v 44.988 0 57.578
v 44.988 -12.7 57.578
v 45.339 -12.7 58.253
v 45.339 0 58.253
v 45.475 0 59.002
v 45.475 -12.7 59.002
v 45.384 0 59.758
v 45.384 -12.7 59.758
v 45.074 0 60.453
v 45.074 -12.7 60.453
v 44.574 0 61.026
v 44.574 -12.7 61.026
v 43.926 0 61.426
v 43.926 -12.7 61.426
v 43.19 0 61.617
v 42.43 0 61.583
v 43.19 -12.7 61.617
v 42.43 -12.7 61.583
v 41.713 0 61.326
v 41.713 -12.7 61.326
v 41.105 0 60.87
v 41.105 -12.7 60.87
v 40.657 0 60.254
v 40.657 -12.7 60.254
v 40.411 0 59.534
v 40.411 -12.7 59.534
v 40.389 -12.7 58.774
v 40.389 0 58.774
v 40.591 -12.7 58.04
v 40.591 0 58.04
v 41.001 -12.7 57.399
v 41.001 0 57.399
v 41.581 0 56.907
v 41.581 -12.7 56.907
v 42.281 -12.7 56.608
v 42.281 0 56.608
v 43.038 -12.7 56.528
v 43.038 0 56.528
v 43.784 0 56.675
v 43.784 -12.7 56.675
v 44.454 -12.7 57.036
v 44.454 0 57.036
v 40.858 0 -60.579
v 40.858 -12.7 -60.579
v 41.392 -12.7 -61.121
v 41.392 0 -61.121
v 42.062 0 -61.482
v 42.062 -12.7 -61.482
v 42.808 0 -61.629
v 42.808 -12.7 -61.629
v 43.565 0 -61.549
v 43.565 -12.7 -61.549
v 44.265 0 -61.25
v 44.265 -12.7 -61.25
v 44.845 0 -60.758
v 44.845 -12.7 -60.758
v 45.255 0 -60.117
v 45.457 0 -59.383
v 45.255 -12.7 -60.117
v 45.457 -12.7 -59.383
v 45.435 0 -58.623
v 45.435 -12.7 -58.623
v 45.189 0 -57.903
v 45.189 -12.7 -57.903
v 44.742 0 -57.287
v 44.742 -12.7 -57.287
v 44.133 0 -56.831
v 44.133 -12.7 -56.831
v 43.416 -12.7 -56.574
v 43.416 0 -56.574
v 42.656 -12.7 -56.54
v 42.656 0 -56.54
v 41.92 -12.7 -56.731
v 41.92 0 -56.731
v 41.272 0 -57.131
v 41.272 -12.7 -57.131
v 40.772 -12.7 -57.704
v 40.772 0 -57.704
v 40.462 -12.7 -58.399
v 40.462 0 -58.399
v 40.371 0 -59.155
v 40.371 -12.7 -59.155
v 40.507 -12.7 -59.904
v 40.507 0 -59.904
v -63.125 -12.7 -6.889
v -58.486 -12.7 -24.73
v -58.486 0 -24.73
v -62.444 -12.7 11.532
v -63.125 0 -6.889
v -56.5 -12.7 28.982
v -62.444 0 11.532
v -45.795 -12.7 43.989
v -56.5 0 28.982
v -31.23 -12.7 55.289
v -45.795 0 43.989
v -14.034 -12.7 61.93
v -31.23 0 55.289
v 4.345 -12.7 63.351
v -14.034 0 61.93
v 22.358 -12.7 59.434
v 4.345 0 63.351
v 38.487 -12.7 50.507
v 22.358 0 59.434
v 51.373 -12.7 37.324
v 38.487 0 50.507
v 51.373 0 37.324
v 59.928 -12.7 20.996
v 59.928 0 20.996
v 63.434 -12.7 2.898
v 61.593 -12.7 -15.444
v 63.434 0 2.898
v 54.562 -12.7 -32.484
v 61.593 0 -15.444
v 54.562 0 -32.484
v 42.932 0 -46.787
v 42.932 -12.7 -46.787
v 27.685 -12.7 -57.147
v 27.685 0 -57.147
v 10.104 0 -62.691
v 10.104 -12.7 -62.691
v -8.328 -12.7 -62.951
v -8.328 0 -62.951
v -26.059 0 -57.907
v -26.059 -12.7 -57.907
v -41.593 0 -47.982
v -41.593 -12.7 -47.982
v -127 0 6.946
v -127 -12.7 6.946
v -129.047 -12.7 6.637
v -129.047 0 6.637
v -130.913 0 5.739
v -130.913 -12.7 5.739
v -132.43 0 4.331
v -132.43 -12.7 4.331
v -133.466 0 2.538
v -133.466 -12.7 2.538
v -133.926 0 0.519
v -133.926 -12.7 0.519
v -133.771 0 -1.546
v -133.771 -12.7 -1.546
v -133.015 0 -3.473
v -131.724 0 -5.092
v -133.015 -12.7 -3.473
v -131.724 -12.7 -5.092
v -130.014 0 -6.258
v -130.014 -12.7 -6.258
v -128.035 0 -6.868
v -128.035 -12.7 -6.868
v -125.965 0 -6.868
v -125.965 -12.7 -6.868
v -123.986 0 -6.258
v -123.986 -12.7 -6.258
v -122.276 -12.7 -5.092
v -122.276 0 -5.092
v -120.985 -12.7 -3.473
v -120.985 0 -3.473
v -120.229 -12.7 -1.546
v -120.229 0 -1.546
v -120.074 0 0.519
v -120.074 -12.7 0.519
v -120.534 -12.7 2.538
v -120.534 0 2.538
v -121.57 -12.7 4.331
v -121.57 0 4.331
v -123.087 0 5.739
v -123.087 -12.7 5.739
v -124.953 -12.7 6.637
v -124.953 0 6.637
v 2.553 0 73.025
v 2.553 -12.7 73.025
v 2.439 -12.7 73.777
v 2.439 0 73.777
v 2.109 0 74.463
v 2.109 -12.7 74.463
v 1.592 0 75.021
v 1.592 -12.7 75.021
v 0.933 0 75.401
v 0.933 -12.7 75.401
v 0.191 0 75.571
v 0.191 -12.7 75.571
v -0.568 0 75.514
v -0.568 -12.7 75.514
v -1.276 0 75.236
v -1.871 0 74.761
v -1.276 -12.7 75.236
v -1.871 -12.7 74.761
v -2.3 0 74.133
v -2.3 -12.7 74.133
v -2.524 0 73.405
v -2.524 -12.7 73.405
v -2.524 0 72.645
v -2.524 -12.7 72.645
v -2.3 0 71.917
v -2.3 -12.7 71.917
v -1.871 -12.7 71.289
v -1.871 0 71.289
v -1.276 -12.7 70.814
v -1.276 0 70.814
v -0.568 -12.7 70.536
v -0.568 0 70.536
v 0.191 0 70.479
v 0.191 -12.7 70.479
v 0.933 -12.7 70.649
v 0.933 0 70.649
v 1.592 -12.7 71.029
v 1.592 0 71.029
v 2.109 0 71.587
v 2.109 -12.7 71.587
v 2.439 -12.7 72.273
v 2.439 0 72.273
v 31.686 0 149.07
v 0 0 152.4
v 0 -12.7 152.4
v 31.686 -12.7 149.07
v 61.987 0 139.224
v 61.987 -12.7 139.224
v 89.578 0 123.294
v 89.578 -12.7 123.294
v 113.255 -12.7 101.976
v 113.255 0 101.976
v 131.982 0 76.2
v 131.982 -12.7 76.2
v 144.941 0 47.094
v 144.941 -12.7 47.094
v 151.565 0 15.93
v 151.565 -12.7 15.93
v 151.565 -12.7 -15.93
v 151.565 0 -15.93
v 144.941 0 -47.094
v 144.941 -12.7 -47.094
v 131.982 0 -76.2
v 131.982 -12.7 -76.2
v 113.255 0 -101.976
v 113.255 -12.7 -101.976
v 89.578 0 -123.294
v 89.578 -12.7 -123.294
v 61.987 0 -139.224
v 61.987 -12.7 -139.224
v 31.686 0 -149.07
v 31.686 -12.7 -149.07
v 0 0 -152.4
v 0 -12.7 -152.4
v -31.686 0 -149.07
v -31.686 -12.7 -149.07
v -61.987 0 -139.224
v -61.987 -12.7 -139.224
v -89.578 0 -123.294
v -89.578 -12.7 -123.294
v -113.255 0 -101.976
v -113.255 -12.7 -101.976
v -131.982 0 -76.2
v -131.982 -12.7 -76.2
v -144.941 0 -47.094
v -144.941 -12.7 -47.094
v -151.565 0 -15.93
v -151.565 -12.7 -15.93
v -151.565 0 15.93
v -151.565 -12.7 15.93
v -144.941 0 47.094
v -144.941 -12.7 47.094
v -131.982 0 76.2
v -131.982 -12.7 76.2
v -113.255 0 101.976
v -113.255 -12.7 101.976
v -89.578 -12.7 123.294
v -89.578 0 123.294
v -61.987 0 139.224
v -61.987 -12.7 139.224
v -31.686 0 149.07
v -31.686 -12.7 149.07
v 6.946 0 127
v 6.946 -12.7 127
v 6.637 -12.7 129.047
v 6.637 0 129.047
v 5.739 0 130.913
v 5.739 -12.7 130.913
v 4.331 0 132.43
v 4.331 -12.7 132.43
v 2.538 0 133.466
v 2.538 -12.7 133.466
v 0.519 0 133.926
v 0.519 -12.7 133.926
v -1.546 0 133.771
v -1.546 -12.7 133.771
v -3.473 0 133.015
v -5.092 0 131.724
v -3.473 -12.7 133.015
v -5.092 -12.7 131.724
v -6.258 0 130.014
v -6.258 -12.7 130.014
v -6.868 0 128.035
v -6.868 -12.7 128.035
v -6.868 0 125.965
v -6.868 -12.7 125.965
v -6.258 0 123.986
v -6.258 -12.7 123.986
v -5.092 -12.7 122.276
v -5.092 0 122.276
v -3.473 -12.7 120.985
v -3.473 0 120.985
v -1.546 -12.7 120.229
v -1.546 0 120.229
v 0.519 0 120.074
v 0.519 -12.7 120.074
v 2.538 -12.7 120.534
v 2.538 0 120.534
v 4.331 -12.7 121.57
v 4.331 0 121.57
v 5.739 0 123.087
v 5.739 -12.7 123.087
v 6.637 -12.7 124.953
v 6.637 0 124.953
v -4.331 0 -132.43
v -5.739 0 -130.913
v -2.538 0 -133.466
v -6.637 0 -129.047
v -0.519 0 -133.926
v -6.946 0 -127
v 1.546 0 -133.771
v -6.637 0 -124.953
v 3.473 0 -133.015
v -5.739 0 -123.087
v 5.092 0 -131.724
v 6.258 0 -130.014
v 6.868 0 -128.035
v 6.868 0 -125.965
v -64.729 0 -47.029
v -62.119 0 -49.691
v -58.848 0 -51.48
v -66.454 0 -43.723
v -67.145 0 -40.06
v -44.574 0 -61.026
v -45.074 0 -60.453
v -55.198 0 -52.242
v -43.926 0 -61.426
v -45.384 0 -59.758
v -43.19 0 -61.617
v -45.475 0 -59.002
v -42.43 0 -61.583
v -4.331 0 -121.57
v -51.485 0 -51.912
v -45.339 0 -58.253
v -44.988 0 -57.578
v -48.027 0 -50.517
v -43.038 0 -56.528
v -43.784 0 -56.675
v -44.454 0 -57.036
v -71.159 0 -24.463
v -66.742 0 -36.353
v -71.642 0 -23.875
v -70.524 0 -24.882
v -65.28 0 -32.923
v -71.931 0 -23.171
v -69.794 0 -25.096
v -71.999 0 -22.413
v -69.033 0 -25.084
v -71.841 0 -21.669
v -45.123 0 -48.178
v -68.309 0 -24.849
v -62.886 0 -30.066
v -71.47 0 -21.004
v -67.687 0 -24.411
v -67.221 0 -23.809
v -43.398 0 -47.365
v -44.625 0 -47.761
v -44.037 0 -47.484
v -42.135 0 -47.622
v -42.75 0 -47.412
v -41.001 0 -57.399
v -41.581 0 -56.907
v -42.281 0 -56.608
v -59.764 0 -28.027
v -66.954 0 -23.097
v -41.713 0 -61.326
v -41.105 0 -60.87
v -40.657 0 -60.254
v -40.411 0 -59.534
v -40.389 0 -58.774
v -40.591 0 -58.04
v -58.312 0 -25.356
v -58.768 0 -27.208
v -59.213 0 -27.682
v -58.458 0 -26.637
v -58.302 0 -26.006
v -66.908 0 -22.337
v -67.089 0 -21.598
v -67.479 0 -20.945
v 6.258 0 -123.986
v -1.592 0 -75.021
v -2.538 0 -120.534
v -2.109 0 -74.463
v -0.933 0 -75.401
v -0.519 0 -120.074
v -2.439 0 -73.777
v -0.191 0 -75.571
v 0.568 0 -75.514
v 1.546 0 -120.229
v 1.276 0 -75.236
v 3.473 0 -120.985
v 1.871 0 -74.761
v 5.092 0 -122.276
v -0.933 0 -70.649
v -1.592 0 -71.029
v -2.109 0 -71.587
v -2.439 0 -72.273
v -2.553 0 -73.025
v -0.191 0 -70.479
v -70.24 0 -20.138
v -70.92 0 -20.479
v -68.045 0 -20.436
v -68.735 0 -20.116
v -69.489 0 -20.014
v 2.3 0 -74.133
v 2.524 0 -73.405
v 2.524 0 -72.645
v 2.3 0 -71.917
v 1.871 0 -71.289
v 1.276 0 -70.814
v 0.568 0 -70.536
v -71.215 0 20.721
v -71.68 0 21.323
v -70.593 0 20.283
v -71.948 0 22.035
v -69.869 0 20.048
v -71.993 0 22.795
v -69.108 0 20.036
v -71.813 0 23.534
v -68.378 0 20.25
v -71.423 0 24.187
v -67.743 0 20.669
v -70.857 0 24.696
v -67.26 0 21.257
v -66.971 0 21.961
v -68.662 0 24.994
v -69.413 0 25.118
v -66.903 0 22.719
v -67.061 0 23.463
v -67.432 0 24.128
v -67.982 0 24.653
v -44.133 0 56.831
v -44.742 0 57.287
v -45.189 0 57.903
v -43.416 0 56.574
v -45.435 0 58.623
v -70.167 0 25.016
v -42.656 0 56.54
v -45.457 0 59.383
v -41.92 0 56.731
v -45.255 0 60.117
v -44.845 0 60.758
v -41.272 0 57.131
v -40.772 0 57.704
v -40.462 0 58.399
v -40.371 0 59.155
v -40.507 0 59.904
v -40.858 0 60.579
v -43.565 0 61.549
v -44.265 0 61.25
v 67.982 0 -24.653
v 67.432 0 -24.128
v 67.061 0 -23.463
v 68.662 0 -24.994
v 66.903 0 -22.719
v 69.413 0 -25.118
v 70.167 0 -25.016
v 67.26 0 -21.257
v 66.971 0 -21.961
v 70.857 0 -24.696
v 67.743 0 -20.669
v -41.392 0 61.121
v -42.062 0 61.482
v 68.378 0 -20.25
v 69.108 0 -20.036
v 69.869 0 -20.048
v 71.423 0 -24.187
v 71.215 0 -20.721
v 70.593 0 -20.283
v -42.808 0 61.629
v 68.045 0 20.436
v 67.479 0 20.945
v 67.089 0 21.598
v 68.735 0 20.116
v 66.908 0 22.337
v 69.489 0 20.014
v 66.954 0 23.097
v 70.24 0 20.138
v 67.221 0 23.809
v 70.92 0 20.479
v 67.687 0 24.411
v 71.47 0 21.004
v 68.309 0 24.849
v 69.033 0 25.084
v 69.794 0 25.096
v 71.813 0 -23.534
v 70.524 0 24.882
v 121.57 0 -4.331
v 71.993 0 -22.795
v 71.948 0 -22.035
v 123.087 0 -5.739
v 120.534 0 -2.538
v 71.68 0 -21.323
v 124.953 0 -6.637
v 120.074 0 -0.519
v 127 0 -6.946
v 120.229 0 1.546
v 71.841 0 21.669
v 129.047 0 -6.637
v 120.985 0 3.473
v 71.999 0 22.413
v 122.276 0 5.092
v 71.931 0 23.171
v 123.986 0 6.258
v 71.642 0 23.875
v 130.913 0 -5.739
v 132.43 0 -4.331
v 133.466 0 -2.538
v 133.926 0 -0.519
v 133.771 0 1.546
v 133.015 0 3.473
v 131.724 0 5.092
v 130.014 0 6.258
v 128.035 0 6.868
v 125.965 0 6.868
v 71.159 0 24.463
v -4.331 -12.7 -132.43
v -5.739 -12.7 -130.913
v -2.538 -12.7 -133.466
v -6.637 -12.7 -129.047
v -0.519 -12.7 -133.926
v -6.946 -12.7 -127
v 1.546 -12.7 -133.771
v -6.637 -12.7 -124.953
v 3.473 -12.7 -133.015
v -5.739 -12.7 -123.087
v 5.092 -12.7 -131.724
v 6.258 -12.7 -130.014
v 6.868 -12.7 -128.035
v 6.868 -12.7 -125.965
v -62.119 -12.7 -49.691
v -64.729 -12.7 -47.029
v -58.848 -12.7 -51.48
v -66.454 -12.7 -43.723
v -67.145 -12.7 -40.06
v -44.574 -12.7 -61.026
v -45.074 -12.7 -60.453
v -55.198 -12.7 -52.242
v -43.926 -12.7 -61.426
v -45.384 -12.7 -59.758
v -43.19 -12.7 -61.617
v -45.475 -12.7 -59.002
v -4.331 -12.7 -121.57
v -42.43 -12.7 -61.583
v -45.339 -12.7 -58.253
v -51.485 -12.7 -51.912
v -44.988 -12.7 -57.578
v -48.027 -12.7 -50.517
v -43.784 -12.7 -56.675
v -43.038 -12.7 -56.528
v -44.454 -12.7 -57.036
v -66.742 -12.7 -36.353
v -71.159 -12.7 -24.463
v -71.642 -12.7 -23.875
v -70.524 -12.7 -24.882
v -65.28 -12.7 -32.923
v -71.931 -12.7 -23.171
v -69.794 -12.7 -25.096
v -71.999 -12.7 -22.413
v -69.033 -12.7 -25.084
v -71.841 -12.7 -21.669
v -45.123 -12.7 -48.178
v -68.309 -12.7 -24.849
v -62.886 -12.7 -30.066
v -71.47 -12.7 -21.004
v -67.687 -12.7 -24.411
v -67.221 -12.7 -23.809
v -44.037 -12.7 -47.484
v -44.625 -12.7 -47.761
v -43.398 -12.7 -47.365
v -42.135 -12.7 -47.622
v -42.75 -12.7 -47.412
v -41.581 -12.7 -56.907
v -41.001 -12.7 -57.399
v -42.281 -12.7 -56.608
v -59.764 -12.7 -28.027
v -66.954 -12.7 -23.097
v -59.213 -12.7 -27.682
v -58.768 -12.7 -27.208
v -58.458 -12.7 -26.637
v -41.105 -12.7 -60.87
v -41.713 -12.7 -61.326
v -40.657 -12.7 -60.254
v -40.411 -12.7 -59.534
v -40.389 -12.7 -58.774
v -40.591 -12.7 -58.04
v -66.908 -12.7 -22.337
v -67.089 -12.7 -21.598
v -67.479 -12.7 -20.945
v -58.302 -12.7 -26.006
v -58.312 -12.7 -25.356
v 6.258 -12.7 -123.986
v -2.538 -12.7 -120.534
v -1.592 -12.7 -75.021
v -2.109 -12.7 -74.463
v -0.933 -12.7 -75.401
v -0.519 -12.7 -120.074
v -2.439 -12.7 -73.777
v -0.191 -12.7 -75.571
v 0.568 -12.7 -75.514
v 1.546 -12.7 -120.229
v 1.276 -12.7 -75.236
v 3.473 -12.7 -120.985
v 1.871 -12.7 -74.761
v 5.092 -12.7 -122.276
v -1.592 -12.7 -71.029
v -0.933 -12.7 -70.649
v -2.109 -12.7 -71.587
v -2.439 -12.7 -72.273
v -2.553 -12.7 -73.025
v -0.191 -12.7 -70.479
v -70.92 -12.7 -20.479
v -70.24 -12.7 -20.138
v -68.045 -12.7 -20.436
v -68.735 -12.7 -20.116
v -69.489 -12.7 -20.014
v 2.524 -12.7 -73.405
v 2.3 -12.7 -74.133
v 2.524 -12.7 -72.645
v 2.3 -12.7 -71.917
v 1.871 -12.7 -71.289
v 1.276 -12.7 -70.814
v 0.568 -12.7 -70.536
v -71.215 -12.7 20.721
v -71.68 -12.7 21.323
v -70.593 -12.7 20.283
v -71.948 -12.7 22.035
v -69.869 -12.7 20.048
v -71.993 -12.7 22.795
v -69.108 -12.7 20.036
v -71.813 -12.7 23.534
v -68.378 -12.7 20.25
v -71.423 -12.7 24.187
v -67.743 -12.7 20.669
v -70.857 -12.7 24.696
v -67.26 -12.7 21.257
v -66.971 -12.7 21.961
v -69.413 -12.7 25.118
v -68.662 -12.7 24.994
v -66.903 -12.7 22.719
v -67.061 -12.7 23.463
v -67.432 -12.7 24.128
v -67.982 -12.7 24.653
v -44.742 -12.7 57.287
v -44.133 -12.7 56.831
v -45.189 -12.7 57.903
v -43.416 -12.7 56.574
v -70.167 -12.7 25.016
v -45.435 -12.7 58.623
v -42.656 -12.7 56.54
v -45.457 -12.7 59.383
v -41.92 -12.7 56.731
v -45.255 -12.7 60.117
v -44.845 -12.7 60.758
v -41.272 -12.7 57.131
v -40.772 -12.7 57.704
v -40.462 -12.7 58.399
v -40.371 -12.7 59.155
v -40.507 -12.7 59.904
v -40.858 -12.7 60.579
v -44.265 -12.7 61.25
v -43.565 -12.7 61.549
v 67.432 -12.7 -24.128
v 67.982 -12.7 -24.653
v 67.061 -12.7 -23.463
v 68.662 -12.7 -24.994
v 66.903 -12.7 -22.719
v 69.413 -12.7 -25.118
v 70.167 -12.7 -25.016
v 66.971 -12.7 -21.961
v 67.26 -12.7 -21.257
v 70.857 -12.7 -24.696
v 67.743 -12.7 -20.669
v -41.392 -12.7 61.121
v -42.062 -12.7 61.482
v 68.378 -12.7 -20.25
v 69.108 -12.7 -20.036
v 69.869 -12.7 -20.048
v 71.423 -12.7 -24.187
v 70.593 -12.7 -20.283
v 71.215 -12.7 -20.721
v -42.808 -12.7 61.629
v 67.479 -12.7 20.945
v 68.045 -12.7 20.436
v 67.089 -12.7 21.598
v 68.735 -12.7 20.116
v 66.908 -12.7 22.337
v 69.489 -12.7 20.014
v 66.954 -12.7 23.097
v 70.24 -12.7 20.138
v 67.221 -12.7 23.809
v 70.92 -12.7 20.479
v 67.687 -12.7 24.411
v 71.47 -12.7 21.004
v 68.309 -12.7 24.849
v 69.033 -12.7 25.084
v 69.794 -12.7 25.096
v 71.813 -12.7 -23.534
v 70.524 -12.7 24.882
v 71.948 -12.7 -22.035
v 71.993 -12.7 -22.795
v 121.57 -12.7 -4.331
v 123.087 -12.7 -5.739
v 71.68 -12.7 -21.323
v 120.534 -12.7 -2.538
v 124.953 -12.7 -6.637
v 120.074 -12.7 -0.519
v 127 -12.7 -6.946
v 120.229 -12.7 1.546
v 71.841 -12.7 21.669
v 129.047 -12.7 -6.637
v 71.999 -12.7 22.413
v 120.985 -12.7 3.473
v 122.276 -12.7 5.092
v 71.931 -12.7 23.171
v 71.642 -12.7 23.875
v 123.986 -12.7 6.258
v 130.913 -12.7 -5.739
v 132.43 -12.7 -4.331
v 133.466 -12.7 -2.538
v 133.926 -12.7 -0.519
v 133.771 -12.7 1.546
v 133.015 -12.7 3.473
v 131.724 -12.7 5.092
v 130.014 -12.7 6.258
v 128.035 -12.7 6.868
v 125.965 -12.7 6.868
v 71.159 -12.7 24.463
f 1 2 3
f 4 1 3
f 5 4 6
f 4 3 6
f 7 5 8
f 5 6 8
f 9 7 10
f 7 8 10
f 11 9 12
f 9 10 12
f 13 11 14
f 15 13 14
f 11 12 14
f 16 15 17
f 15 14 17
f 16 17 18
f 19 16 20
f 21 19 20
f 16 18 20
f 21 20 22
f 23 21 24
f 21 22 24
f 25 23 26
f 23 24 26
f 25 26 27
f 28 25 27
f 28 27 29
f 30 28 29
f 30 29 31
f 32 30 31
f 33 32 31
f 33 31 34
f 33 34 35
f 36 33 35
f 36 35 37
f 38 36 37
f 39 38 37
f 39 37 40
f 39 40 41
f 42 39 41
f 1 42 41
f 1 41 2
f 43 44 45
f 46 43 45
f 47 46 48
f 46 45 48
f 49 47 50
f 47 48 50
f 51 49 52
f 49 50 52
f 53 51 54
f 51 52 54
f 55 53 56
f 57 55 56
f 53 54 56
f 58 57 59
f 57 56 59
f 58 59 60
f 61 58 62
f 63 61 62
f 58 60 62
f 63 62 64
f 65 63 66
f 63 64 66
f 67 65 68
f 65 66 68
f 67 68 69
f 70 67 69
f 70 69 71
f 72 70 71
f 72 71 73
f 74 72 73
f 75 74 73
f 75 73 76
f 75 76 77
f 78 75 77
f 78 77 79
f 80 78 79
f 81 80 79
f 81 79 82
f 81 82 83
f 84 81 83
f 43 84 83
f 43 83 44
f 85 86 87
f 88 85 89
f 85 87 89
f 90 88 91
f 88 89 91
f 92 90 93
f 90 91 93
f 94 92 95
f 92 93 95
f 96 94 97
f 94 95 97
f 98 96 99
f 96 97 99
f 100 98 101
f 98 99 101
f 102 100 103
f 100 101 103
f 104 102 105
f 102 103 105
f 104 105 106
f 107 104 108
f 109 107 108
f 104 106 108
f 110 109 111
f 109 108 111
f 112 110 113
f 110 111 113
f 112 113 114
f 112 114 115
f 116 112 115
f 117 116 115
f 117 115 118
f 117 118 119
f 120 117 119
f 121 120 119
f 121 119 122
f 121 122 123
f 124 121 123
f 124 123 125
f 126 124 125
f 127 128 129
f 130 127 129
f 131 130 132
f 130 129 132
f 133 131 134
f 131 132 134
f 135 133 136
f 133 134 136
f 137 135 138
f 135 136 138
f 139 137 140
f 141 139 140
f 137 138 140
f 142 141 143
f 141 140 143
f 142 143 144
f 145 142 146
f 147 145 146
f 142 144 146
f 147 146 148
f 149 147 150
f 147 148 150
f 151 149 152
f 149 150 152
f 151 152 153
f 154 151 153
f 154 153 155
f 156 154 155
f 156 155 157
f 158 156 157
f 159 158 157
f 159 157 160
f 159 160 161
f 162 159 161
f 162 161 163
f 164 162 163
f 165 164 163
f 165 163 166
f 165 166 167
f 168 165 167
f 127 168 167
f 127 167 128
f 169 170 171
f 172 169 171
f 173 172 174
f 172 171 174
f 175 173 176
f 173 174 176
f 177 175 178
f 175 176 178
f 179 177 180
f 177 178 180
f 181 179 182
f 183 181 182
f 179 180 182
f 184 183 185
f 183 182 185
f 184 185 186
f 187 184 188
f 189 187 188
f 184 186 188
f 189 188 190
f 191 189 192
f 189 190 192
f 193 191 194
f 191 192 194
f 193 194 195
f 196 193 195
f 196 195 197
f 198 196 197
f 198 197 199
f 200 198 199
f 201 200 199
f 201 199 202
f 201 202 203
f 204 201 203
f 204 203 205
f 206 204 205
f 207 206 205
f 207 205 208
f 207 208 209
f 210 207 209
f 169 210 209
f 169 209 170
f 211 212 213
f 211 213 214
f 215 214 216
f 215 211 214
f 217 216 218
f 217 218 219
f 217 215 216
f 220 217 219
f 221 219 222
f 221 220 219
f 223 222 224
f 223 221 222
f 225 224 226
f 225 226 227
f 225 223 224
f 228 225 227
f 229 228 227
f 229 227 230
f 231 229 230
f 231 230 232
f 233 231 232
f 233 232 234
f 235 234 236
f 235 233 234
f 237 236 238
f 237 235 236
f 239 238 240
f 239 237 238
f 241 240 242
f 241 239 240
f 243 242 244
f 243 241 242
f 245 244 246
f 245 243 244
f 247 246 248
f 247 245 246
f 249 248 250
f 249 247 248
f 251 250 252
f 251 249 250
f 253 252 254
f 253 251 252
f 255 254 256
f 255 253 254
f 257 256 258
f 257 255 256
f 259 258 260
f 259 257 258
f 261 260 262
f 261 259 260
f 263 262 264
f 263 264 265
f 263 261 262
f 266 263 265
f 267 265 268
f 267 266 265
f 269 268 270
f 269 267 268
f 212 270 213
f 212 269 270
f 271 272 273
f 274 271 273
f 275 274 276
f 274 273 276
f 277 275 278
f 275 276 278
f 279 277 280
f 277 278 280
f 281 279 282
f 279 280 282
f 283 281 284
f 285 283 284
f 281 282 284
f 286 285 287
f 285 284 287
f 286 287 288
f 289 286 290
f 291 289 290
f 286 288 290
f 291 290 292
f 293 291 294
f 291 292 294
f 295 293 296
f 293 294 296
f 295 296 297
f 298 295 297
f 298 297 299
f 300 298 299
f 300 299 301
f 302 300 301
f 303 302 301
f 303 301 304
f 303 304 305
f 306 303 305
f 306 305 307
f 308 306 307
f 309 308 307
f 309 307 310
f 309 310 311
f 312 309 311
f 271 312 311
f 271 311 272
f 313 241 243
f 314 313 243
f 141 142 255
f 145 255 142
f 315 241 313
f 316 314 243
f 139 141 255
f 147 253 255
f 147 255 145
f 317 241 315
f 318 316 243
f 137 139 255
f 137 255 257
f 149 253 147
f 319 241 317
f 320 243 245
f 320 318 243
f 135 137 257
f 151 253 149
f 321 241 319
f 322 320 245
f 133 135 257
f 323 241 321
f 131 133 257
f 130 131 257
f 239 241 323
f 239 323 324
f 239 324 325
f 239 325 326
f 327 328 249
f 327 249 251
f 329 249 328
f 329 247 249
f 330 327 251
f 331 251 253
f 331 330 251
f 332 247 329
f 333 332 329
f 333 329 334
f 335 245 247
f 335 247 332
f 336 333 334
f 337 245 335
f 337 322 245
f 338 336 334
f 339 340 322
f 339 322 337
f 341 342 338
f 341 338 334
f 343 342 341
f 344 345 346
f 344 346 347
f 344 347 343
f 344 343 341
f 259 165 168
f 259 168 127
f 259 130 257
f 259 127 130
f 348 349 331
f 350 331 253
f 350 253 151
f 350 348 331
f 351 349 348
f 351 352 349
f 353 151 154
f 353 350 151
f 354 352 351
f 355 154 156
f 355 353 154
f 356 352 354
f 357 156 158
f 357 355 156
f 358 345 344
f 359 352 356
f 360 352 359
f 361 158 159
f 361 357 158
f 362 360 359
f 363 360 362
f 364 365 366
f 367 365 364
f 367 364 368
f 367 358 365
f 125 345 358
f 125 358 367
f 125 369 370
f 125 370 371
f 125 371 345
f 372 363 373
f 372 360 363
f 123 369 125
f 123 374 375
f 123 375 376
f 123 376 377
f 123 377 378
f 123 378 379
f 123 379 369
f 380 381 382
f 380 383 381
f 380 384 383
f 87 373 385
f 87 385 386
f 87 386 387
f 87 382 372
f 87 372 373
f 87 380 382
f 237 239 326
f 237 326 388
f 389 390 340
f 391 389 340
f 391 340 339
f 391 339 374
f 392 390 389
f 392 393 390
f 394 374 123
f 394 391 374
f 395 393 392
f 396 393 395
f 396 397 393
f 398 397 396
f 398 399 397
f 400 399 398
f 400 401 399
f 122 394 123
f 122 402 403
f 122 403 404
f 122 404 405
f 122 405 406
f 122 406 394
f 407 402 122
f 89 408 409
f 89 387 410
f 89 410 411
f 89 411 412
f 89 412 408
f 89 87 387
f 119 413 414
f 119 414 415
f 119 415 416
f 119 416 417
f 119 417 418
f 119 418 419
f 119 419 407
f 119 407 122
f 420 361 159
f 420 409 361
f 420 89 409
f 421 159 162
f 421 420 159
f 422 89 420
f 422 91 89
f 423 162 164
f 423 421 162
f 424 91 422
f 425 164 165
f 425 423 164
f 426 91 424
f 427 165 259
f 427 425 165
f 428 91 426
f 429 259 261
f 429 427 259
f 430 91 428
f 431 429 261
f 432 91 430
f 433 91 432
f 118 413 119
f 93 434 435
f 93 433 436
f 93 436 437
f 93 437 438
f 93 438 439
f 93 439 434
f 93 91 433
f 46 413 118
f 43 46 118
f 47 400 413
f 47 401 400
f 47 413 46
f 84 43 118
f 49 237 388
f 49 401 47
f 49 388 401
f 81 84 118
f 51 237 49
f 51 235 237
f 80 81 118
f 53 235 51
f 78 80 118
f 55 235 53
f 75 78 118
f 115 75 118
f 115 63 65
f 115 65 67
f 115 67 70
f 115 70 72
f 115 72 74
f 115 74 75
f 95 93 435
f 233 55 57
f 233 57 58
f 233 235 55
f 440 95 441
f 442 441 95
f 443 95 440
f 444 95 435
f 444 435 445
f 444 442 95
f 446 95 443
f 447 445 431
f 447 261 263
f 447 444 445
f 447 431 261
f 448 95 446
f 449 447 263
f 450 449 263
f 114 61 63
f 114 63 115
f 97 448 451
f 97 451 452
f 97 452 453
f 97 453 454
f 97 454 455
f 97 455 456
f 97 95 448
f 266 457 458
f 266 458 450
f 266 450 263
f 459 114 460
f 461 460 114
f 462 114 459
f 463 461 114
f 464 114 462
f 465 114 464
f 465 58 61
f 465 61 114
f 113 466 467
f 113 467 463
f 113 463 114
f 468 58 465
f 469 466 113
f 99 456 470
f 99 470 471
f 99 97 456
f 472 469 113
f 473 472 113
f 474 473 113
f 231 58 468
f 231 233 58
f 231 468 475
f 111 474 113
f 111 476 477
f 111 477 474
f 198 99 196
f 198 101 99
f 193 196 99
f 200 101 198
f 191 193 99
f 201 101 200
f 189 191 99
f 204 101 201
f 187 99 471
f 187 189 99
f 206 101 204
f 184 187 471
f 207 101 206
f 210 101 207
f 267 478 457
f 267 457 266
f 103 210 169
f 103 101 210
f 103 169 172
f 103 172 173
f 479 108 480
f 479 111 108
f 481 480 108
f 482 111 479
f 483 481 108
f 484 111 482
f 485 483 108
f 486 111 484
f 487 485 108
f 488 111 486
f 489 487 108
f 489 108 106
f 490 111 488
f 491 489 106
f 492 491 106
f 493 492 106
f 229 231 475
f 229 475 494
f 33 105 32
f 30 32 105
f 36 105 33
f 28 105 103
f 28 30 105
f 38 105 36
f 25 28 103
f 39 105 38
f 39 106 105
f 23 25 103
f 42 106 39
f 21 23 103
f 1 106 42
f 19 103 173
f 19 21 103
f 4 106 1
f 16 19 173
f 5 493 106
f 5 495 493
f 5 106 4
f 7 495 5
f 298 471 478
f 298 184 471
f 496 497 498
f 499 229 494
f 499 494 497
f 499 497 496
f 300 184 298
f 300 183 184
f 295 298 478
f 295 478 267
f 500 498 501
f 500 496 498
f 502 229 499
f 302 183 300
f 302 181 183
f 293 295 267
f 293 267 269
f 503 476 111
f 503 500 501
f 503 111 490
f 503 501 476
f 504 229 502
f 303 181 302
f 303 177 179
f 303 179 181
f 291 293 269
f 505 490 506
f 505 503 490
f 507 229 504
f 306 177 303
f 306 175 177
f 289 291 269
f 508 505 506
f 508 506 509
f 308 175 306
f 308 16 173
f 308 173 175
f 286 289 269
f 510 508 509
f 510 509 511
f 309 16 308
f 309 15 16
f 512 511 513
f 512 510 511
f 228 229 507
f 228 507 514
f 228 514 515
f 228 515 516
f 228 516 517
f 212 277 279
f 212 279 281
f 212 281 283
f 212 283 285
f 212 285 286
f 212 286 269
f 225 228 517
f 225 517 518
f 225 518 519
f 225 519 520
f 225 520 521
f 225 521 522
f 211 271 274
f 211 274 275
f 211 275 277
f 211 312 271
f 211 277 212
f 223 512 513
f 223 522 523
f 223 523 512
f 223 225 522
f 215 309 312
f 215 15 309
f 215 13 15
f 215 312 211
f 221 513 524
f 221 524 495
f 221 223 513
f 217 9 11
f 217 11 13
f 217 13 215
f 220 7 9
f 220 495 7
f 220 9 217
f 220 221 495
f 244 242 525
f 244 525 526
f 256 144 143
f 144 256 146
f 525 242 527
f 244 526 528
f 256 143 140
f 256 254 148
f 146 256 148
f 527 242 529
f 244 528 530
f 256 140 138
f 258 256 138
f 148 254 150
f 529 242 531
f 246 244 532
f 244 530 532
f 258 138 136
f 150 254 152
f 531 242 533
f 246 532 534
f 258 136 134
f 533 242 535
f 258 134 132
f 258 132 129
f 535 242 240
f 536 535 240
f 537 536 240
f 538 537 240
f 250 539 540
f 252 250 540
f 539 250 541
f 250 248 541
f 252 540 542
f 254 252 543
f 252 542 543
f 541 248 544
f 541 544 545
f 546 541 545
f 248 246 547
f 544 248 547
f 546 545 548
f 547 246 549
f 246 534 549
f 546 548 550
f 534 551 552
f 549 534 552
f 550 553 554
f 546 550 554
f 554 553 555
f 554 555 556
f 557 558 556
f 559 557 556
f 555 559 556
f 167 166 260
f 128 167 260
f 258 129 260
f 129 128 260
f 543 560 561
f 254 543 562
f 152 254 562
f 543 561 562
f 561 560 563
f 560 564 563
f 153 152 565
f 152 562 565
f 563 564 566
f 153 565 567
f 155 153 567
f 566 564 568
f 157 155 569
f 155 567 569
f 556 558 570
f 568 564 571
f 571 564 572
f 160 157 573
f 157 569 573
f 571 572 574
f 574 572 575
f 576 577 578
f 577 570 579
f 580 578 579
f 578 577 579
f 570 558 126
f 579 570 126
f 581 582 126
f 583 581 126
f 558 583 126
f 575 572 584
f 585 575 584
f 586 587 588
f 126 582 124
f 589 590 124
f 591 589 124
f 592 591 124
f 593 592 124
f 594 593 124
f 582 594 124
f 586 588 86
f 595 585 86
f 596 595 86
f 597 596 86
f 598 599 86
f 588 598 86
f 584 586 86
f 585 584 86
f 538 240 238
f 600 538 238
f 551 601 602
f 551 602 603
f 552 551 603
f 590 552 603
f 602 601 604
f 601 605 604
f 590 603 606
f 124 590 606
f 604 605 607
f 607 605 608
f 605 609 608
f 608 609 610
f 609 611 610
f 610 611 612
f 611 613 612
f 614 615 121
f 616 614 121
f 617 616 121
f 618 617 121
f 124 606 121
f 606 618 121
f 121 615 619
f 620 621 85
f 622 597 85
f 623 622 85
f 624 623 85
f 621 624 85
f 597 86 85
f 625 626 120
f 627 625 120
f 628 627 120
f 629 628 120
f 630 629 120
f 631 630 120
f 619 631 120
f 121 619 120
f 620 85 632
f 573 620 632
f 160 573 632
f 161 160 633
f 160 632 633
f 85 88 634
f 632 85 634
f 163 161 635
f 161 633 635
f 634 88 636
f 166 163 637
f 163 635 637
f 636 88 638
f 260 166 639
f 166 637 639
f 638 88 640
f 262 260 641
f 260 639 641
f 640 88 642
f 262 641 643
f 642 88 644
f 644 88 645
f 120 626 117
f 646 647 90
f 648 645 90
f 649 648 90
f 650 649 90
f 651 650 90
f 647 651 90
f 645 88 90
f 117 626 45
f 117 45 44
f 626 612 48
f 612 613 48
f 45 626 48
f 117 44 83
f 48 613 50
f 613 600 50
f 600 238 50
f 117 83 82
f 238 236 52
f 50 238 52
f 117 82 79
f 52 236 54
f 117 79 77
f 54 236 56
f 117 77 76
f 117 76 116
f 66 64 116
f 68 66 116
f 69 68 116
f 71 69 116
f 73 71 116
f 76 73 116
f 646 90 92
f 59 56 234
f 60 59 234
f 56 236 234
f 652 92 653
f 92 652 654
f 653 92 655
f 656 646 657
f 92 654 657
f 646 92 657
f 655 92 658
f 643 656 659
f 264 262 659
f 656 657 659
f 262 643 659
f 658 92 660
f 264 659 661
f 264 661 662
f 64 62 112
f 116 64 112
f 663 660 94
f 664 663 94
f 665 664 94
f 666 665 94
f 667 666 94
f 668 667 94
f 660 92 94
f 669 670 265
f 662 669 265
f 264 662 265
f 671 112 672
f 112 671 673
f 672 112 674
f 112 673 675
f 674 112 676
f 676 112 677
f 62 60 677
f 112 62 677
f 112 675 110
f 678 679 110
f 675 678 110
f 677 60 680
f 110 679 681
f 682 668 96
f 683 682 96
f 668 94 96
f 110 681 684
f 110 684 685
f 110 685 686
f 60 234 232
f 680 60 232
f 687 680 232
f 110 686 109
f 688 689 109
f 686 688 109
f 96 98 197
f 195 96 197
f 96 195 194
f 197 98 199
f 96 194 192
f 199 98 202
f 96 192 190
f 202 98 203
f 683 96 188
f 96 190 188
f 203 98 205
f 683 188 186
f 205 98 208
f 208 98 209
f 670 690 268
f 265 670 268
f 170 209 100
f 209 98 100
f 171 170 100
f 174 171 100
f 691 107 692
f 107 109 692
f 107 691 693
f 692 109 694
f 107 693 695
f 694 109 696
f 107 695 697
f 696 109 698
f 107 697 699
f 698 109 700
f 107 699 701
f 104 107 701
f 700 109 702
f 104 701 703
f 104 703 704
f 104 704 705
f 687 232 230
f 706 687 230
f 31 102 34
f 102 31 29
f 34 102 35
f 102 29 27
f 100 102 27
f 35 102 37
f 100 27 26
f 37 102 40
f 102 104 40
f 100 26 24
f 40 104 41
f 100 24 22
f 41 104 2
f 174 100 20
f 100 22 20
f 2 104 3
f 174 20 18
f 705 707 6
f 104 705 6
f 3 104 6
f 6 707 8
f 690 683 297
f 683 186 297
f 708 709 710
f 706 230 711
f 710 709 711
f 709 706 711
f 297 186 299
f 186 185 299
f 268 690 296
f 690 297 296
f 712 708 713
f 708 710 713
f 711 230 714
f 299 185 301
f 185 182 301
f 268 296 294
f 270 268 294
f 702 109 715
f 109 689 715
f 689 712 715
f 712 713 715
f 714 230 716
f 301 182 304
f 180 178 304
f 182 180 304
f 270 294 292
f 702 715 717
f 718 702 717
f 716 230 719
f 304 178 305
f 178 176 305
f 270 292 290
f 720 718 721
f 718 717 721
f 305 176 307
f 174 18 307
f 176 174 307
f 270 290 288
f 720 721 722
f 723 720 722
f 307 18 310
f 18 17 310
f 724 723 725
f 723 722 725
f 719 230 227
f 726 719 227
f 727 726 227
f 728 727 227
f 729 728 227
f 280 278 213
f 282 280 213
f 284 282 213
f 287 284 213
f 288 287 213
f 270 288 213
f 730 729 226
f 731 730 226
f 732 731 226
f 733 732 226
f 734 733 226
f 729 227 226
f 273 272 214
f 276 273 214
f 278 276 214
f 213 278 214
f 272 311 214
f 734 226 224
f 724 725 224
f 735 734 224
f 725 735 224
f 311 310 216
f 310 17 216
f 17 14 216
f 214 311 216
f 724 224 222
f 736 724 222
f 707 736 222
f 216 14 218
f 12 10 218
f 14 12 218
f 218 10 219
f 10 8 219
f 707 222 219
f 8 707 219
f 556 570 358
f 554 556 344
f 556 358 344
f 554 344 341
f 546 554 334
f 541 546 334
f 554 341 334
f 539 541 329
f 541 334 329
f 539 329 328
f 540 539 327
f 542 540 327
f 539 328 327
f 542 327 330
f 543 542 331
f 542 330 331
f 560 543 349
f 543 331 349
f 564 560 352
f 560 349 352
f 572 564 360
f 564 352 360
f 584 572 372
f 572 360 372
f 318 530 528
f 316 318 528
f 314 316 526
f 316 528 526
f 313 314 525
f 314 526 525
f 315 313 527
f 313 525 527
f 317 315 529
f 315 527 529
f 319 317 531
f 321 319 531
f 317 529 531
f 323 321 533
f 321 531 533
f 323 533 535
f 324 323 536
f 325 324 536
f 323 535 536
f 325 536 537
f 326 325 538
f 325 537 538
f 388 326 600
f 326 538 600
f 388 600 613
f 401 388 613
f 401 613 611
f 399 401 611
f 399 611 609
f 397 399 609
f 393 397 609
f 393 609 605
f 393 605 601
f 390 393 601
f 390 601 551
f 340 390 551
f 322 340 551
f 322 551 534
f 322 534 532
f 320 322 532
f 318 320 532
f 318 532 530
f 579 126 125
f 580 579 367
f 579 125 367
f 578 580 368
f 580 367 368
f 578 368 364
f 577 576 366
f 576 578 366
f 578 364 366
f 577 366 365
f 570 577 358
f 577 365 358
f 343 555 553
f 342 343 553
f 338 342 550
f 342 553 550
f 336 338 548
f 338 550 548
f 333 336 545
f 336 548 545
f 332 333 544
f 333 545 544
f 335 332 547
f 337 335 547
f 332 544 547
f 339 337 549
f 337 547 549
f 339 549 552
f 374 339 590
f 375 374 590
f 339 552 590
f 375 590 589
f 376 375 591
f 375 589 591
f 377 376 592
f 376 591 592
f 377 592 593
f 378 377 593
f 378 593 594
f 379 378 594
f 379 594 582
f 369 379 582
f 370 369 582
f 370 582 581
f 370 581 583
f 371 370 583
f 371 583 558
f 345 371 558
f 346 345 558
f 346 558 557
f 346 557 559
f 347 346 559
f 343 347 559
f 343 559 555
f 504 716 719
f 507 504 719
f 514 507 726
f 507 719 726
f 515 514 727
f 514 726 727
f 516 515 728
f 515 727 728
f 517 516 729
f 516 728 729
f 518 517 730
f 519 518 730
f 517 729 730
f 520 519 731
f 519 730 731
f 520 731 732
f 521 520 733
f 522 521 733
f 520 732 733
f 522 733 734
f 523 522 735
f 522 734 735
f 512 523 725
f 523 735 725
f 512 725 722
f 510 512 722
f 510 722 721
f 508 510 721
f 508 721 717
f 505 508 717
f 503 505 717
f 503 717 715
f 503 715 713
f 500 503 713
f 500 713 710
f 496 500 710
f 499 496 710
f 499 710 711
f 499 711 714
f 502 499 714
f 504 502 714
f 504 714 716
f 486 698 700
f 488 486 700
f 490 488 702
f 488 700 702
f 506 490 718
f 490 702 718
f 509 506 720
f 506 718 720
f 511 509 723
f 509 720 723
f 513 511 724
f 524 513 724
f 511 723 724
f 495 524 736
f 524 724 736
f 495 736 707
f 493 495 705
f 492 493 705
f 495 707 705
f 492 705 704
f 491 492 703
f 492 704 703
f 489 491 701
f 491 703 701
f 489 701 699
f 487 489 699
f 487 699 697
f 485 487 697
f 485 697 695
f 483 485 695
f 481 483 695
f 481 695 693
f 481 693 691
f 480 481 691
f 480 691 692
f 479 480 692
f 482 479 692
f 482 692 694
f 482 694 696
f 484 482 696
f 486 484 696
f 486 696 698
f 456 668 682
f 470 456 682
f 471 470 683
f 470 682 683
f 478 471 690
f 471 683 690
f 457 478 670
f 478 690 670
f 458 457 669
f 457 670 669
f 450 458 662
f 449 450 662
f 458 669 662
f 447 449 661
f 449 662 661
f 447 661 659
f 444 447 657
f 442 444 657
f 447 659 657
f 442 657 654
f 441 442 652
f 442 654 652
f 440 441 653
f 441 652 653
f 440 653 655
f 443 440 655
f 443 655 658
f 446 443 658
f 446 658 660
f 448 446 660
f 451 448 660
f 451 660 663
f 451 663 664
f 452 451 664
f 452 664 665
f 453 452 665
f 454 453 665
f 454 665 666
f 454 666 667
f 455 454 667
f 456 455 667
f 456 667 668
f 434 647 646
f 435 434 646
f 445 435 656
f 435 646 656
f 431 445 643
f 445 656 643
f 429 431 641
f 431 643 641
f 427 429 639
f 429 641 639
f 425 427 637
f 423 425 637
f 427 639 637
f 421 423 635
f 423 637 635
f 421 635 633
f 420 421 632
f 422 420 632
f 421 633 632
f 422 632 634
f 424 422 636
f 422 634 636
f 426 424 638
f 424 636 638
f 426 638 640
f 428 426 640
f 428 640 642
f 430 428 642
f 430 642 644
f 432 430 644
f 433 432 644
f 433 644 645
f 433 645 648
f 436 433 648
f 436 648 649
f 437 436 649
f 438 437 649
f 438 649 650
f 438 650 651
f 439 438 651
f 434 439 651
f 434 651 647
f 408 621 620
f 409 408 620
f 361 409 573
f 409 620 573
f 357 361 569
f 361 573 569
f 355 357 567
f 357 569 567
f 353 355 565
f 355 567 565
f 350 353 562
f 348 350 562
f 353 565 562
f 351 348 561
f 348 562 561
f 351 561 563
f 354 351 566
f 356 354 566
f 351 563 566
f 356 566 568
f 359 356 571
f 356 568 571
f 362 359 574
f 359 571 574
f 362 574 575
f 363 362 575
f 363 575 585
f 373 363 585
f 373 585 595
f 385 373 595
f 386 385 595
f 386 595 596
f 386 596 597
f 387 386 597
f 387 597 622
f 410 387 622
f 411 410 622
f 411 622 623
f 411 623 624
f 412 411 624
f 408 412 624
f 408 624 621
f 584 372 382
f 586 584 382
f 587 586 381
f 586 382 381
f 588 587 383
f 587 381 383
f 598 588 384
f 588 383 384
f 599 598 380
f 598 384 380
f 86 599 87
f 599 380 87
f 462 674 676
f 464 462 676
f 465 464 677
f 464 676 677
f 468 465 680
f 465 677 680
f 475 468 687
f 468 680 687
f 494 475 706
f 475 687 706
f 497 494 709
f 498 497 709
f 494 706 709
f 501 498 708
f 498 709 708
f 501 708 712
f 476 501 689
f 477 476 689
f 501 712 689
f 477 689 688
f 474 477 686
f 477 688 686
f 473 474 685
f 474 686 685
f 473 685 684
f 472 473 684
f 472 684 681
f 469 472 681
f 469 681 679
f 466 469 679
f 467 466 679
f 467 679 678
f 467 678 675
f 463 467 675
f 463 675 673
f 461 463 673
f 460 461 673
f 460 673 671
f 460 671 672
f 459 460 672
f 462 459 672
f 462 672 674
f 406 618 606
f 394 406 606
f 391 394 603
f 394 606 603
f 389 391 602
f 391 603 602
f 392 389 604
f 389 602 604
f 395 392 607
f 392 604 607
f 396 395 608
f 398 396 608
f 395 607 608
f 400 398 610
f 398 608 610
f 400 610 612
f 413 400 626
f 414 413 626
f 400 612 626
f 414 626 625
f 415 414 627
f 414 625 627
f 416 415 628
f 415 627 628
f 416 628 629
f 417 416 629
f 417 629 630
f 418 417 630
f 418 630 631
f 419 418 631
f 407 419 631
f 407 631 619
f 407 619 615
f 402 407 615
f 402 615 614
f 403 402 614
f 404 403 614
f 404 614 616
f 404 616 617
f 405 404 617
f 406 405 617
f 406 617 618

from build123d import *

# Parameters (mm, degrees)
SKETCH1_R                           = 152.4
SKETCH1_R_2                         = 63.5
THRUSTPLATE_TC3_DEPTH               = 12.7
UNDEF_CLEARANCE_THRUSTPLATE_D       = 13.89126
CLEARANCE_THRUSTPLATE_PATTERN_COUNT = 4
F_10_CLEARANCE_HOLE1_D              = 5.1054
CIRPATTERN1_COUNT                   = 10
CUT_EXTRUDE1_REACH                  = 217.9


with BuildPart() as part:
    # Sketch1 → ThrustPlate_TC3 (new body)
    with BuildSketch(Plane(origin=(0, 0, 0), x_dir=(1, 0, 0), z_dir=(0, 1, 0))):
        with Locations(Location((0, 0, 0), (0, 0, 270))):
            Circle(SKETCH1_R)
        with Locations(Location((0, 0, 0), (0, 0, 270))):
            Circle(SKETCH1_R_2, mode=Mode.SUBTRACT)
    extrude(amount=-THRUSTPLATE_TC3_DEPTH)

    # UNDEF_Clearance_ThrustPlate (through all)
    with Locations(Plane(origin=(0, 0, 0), x_dir=(1, 0, 0), z_dir=(0, 1, 0))):
        with Locations((0, 127)):
            undef_clearance_thrustplate = Hole(UNDEF_CLEARANCE_THRUSTPLATE_D / 2)

    # Clearance_ThrustPlate_Pattern: UNDEF_Clearance_ThrustPlate ×4 about axis
    clearance_thrustplate_pattern_axis = Axis((0, 0, 0), (0, 1, 0))
    for i in range(1, CLEARANCE_THRUSTPLATE_PATTERN_COUNT):
        add(undef_clearance_thrustplate.rotate(clearance_thrustplate_pattern_axis, i * 360 / CLEARANCE_THRUSTPLATE_PATTERN_COUNT), mode=Mode.SUBTRACT)

    # #10 Clearance Hole1 (through all)
    with Locations(Plane(origin=(0, 0, 0), x_dir=(1, 0, 0), z_dir=(0, 1, 0))):
        with Locations((0, 73.025)):
            f_10_clearance_hole1 = Hole(F_10_CLEARANCE_HOLE1_D / 2)

    # CirPattern1: #10 Clearance Hole1 ×10 about axis
    cirpattern1_axis = Axis((0, 0, 0), (0, 1, 0))
    for i in range(1, CIRPATTERN1_COUNT):
        add(f_10_clearance_hole1.rotate(cirpattern1_axis, i * 360 / CIRPATTERN1_COUNT), mode=Mode.SUBTRACT)

    # Sketch24 → Cut-Extrude1 (cut, up to next)
    with BuildSketch(Plane(origin=(0, 0, 0), x_dir=(1, 0, 0), z_dir=(0, 1, 0)), mode=Mode.PRIVATE) as cut_extrude1_sk1:
        with BuildLine():
            ThreePointArc((-45.123199962, 48.17827493), (-64.72944972, 47.028698036), (-59.764097944, 28.026807647))
            ThreePointArc((-59.764097944, 28.026807647), (-58.45757522, 26.637277771), (-58.48647188, 24.73019626))
            ThreePointArc((-58.48647188, 24.73019626), (-51.372579143, 37.324363521), (-41.593128054, 47.981889278))
            ThreePointArc((-41.593128054, 47.981889278), (-43.397940793, 47.365086324), (-45.123199962, 48.17827493))
        make_face()
    cut_extrude1_tool1 = extrude(cut_extrude1_sk1.sketch, amount=-CUT_EXTRUDE1_REACH, mode=Mode.PRIVATE) & part.part
    add(cut_extrude1_tool1.solids().sort_by_distance((-57.000167, 0, -41.413046))[0], mode=Mode.SUBTRACT)


solid = part.part
